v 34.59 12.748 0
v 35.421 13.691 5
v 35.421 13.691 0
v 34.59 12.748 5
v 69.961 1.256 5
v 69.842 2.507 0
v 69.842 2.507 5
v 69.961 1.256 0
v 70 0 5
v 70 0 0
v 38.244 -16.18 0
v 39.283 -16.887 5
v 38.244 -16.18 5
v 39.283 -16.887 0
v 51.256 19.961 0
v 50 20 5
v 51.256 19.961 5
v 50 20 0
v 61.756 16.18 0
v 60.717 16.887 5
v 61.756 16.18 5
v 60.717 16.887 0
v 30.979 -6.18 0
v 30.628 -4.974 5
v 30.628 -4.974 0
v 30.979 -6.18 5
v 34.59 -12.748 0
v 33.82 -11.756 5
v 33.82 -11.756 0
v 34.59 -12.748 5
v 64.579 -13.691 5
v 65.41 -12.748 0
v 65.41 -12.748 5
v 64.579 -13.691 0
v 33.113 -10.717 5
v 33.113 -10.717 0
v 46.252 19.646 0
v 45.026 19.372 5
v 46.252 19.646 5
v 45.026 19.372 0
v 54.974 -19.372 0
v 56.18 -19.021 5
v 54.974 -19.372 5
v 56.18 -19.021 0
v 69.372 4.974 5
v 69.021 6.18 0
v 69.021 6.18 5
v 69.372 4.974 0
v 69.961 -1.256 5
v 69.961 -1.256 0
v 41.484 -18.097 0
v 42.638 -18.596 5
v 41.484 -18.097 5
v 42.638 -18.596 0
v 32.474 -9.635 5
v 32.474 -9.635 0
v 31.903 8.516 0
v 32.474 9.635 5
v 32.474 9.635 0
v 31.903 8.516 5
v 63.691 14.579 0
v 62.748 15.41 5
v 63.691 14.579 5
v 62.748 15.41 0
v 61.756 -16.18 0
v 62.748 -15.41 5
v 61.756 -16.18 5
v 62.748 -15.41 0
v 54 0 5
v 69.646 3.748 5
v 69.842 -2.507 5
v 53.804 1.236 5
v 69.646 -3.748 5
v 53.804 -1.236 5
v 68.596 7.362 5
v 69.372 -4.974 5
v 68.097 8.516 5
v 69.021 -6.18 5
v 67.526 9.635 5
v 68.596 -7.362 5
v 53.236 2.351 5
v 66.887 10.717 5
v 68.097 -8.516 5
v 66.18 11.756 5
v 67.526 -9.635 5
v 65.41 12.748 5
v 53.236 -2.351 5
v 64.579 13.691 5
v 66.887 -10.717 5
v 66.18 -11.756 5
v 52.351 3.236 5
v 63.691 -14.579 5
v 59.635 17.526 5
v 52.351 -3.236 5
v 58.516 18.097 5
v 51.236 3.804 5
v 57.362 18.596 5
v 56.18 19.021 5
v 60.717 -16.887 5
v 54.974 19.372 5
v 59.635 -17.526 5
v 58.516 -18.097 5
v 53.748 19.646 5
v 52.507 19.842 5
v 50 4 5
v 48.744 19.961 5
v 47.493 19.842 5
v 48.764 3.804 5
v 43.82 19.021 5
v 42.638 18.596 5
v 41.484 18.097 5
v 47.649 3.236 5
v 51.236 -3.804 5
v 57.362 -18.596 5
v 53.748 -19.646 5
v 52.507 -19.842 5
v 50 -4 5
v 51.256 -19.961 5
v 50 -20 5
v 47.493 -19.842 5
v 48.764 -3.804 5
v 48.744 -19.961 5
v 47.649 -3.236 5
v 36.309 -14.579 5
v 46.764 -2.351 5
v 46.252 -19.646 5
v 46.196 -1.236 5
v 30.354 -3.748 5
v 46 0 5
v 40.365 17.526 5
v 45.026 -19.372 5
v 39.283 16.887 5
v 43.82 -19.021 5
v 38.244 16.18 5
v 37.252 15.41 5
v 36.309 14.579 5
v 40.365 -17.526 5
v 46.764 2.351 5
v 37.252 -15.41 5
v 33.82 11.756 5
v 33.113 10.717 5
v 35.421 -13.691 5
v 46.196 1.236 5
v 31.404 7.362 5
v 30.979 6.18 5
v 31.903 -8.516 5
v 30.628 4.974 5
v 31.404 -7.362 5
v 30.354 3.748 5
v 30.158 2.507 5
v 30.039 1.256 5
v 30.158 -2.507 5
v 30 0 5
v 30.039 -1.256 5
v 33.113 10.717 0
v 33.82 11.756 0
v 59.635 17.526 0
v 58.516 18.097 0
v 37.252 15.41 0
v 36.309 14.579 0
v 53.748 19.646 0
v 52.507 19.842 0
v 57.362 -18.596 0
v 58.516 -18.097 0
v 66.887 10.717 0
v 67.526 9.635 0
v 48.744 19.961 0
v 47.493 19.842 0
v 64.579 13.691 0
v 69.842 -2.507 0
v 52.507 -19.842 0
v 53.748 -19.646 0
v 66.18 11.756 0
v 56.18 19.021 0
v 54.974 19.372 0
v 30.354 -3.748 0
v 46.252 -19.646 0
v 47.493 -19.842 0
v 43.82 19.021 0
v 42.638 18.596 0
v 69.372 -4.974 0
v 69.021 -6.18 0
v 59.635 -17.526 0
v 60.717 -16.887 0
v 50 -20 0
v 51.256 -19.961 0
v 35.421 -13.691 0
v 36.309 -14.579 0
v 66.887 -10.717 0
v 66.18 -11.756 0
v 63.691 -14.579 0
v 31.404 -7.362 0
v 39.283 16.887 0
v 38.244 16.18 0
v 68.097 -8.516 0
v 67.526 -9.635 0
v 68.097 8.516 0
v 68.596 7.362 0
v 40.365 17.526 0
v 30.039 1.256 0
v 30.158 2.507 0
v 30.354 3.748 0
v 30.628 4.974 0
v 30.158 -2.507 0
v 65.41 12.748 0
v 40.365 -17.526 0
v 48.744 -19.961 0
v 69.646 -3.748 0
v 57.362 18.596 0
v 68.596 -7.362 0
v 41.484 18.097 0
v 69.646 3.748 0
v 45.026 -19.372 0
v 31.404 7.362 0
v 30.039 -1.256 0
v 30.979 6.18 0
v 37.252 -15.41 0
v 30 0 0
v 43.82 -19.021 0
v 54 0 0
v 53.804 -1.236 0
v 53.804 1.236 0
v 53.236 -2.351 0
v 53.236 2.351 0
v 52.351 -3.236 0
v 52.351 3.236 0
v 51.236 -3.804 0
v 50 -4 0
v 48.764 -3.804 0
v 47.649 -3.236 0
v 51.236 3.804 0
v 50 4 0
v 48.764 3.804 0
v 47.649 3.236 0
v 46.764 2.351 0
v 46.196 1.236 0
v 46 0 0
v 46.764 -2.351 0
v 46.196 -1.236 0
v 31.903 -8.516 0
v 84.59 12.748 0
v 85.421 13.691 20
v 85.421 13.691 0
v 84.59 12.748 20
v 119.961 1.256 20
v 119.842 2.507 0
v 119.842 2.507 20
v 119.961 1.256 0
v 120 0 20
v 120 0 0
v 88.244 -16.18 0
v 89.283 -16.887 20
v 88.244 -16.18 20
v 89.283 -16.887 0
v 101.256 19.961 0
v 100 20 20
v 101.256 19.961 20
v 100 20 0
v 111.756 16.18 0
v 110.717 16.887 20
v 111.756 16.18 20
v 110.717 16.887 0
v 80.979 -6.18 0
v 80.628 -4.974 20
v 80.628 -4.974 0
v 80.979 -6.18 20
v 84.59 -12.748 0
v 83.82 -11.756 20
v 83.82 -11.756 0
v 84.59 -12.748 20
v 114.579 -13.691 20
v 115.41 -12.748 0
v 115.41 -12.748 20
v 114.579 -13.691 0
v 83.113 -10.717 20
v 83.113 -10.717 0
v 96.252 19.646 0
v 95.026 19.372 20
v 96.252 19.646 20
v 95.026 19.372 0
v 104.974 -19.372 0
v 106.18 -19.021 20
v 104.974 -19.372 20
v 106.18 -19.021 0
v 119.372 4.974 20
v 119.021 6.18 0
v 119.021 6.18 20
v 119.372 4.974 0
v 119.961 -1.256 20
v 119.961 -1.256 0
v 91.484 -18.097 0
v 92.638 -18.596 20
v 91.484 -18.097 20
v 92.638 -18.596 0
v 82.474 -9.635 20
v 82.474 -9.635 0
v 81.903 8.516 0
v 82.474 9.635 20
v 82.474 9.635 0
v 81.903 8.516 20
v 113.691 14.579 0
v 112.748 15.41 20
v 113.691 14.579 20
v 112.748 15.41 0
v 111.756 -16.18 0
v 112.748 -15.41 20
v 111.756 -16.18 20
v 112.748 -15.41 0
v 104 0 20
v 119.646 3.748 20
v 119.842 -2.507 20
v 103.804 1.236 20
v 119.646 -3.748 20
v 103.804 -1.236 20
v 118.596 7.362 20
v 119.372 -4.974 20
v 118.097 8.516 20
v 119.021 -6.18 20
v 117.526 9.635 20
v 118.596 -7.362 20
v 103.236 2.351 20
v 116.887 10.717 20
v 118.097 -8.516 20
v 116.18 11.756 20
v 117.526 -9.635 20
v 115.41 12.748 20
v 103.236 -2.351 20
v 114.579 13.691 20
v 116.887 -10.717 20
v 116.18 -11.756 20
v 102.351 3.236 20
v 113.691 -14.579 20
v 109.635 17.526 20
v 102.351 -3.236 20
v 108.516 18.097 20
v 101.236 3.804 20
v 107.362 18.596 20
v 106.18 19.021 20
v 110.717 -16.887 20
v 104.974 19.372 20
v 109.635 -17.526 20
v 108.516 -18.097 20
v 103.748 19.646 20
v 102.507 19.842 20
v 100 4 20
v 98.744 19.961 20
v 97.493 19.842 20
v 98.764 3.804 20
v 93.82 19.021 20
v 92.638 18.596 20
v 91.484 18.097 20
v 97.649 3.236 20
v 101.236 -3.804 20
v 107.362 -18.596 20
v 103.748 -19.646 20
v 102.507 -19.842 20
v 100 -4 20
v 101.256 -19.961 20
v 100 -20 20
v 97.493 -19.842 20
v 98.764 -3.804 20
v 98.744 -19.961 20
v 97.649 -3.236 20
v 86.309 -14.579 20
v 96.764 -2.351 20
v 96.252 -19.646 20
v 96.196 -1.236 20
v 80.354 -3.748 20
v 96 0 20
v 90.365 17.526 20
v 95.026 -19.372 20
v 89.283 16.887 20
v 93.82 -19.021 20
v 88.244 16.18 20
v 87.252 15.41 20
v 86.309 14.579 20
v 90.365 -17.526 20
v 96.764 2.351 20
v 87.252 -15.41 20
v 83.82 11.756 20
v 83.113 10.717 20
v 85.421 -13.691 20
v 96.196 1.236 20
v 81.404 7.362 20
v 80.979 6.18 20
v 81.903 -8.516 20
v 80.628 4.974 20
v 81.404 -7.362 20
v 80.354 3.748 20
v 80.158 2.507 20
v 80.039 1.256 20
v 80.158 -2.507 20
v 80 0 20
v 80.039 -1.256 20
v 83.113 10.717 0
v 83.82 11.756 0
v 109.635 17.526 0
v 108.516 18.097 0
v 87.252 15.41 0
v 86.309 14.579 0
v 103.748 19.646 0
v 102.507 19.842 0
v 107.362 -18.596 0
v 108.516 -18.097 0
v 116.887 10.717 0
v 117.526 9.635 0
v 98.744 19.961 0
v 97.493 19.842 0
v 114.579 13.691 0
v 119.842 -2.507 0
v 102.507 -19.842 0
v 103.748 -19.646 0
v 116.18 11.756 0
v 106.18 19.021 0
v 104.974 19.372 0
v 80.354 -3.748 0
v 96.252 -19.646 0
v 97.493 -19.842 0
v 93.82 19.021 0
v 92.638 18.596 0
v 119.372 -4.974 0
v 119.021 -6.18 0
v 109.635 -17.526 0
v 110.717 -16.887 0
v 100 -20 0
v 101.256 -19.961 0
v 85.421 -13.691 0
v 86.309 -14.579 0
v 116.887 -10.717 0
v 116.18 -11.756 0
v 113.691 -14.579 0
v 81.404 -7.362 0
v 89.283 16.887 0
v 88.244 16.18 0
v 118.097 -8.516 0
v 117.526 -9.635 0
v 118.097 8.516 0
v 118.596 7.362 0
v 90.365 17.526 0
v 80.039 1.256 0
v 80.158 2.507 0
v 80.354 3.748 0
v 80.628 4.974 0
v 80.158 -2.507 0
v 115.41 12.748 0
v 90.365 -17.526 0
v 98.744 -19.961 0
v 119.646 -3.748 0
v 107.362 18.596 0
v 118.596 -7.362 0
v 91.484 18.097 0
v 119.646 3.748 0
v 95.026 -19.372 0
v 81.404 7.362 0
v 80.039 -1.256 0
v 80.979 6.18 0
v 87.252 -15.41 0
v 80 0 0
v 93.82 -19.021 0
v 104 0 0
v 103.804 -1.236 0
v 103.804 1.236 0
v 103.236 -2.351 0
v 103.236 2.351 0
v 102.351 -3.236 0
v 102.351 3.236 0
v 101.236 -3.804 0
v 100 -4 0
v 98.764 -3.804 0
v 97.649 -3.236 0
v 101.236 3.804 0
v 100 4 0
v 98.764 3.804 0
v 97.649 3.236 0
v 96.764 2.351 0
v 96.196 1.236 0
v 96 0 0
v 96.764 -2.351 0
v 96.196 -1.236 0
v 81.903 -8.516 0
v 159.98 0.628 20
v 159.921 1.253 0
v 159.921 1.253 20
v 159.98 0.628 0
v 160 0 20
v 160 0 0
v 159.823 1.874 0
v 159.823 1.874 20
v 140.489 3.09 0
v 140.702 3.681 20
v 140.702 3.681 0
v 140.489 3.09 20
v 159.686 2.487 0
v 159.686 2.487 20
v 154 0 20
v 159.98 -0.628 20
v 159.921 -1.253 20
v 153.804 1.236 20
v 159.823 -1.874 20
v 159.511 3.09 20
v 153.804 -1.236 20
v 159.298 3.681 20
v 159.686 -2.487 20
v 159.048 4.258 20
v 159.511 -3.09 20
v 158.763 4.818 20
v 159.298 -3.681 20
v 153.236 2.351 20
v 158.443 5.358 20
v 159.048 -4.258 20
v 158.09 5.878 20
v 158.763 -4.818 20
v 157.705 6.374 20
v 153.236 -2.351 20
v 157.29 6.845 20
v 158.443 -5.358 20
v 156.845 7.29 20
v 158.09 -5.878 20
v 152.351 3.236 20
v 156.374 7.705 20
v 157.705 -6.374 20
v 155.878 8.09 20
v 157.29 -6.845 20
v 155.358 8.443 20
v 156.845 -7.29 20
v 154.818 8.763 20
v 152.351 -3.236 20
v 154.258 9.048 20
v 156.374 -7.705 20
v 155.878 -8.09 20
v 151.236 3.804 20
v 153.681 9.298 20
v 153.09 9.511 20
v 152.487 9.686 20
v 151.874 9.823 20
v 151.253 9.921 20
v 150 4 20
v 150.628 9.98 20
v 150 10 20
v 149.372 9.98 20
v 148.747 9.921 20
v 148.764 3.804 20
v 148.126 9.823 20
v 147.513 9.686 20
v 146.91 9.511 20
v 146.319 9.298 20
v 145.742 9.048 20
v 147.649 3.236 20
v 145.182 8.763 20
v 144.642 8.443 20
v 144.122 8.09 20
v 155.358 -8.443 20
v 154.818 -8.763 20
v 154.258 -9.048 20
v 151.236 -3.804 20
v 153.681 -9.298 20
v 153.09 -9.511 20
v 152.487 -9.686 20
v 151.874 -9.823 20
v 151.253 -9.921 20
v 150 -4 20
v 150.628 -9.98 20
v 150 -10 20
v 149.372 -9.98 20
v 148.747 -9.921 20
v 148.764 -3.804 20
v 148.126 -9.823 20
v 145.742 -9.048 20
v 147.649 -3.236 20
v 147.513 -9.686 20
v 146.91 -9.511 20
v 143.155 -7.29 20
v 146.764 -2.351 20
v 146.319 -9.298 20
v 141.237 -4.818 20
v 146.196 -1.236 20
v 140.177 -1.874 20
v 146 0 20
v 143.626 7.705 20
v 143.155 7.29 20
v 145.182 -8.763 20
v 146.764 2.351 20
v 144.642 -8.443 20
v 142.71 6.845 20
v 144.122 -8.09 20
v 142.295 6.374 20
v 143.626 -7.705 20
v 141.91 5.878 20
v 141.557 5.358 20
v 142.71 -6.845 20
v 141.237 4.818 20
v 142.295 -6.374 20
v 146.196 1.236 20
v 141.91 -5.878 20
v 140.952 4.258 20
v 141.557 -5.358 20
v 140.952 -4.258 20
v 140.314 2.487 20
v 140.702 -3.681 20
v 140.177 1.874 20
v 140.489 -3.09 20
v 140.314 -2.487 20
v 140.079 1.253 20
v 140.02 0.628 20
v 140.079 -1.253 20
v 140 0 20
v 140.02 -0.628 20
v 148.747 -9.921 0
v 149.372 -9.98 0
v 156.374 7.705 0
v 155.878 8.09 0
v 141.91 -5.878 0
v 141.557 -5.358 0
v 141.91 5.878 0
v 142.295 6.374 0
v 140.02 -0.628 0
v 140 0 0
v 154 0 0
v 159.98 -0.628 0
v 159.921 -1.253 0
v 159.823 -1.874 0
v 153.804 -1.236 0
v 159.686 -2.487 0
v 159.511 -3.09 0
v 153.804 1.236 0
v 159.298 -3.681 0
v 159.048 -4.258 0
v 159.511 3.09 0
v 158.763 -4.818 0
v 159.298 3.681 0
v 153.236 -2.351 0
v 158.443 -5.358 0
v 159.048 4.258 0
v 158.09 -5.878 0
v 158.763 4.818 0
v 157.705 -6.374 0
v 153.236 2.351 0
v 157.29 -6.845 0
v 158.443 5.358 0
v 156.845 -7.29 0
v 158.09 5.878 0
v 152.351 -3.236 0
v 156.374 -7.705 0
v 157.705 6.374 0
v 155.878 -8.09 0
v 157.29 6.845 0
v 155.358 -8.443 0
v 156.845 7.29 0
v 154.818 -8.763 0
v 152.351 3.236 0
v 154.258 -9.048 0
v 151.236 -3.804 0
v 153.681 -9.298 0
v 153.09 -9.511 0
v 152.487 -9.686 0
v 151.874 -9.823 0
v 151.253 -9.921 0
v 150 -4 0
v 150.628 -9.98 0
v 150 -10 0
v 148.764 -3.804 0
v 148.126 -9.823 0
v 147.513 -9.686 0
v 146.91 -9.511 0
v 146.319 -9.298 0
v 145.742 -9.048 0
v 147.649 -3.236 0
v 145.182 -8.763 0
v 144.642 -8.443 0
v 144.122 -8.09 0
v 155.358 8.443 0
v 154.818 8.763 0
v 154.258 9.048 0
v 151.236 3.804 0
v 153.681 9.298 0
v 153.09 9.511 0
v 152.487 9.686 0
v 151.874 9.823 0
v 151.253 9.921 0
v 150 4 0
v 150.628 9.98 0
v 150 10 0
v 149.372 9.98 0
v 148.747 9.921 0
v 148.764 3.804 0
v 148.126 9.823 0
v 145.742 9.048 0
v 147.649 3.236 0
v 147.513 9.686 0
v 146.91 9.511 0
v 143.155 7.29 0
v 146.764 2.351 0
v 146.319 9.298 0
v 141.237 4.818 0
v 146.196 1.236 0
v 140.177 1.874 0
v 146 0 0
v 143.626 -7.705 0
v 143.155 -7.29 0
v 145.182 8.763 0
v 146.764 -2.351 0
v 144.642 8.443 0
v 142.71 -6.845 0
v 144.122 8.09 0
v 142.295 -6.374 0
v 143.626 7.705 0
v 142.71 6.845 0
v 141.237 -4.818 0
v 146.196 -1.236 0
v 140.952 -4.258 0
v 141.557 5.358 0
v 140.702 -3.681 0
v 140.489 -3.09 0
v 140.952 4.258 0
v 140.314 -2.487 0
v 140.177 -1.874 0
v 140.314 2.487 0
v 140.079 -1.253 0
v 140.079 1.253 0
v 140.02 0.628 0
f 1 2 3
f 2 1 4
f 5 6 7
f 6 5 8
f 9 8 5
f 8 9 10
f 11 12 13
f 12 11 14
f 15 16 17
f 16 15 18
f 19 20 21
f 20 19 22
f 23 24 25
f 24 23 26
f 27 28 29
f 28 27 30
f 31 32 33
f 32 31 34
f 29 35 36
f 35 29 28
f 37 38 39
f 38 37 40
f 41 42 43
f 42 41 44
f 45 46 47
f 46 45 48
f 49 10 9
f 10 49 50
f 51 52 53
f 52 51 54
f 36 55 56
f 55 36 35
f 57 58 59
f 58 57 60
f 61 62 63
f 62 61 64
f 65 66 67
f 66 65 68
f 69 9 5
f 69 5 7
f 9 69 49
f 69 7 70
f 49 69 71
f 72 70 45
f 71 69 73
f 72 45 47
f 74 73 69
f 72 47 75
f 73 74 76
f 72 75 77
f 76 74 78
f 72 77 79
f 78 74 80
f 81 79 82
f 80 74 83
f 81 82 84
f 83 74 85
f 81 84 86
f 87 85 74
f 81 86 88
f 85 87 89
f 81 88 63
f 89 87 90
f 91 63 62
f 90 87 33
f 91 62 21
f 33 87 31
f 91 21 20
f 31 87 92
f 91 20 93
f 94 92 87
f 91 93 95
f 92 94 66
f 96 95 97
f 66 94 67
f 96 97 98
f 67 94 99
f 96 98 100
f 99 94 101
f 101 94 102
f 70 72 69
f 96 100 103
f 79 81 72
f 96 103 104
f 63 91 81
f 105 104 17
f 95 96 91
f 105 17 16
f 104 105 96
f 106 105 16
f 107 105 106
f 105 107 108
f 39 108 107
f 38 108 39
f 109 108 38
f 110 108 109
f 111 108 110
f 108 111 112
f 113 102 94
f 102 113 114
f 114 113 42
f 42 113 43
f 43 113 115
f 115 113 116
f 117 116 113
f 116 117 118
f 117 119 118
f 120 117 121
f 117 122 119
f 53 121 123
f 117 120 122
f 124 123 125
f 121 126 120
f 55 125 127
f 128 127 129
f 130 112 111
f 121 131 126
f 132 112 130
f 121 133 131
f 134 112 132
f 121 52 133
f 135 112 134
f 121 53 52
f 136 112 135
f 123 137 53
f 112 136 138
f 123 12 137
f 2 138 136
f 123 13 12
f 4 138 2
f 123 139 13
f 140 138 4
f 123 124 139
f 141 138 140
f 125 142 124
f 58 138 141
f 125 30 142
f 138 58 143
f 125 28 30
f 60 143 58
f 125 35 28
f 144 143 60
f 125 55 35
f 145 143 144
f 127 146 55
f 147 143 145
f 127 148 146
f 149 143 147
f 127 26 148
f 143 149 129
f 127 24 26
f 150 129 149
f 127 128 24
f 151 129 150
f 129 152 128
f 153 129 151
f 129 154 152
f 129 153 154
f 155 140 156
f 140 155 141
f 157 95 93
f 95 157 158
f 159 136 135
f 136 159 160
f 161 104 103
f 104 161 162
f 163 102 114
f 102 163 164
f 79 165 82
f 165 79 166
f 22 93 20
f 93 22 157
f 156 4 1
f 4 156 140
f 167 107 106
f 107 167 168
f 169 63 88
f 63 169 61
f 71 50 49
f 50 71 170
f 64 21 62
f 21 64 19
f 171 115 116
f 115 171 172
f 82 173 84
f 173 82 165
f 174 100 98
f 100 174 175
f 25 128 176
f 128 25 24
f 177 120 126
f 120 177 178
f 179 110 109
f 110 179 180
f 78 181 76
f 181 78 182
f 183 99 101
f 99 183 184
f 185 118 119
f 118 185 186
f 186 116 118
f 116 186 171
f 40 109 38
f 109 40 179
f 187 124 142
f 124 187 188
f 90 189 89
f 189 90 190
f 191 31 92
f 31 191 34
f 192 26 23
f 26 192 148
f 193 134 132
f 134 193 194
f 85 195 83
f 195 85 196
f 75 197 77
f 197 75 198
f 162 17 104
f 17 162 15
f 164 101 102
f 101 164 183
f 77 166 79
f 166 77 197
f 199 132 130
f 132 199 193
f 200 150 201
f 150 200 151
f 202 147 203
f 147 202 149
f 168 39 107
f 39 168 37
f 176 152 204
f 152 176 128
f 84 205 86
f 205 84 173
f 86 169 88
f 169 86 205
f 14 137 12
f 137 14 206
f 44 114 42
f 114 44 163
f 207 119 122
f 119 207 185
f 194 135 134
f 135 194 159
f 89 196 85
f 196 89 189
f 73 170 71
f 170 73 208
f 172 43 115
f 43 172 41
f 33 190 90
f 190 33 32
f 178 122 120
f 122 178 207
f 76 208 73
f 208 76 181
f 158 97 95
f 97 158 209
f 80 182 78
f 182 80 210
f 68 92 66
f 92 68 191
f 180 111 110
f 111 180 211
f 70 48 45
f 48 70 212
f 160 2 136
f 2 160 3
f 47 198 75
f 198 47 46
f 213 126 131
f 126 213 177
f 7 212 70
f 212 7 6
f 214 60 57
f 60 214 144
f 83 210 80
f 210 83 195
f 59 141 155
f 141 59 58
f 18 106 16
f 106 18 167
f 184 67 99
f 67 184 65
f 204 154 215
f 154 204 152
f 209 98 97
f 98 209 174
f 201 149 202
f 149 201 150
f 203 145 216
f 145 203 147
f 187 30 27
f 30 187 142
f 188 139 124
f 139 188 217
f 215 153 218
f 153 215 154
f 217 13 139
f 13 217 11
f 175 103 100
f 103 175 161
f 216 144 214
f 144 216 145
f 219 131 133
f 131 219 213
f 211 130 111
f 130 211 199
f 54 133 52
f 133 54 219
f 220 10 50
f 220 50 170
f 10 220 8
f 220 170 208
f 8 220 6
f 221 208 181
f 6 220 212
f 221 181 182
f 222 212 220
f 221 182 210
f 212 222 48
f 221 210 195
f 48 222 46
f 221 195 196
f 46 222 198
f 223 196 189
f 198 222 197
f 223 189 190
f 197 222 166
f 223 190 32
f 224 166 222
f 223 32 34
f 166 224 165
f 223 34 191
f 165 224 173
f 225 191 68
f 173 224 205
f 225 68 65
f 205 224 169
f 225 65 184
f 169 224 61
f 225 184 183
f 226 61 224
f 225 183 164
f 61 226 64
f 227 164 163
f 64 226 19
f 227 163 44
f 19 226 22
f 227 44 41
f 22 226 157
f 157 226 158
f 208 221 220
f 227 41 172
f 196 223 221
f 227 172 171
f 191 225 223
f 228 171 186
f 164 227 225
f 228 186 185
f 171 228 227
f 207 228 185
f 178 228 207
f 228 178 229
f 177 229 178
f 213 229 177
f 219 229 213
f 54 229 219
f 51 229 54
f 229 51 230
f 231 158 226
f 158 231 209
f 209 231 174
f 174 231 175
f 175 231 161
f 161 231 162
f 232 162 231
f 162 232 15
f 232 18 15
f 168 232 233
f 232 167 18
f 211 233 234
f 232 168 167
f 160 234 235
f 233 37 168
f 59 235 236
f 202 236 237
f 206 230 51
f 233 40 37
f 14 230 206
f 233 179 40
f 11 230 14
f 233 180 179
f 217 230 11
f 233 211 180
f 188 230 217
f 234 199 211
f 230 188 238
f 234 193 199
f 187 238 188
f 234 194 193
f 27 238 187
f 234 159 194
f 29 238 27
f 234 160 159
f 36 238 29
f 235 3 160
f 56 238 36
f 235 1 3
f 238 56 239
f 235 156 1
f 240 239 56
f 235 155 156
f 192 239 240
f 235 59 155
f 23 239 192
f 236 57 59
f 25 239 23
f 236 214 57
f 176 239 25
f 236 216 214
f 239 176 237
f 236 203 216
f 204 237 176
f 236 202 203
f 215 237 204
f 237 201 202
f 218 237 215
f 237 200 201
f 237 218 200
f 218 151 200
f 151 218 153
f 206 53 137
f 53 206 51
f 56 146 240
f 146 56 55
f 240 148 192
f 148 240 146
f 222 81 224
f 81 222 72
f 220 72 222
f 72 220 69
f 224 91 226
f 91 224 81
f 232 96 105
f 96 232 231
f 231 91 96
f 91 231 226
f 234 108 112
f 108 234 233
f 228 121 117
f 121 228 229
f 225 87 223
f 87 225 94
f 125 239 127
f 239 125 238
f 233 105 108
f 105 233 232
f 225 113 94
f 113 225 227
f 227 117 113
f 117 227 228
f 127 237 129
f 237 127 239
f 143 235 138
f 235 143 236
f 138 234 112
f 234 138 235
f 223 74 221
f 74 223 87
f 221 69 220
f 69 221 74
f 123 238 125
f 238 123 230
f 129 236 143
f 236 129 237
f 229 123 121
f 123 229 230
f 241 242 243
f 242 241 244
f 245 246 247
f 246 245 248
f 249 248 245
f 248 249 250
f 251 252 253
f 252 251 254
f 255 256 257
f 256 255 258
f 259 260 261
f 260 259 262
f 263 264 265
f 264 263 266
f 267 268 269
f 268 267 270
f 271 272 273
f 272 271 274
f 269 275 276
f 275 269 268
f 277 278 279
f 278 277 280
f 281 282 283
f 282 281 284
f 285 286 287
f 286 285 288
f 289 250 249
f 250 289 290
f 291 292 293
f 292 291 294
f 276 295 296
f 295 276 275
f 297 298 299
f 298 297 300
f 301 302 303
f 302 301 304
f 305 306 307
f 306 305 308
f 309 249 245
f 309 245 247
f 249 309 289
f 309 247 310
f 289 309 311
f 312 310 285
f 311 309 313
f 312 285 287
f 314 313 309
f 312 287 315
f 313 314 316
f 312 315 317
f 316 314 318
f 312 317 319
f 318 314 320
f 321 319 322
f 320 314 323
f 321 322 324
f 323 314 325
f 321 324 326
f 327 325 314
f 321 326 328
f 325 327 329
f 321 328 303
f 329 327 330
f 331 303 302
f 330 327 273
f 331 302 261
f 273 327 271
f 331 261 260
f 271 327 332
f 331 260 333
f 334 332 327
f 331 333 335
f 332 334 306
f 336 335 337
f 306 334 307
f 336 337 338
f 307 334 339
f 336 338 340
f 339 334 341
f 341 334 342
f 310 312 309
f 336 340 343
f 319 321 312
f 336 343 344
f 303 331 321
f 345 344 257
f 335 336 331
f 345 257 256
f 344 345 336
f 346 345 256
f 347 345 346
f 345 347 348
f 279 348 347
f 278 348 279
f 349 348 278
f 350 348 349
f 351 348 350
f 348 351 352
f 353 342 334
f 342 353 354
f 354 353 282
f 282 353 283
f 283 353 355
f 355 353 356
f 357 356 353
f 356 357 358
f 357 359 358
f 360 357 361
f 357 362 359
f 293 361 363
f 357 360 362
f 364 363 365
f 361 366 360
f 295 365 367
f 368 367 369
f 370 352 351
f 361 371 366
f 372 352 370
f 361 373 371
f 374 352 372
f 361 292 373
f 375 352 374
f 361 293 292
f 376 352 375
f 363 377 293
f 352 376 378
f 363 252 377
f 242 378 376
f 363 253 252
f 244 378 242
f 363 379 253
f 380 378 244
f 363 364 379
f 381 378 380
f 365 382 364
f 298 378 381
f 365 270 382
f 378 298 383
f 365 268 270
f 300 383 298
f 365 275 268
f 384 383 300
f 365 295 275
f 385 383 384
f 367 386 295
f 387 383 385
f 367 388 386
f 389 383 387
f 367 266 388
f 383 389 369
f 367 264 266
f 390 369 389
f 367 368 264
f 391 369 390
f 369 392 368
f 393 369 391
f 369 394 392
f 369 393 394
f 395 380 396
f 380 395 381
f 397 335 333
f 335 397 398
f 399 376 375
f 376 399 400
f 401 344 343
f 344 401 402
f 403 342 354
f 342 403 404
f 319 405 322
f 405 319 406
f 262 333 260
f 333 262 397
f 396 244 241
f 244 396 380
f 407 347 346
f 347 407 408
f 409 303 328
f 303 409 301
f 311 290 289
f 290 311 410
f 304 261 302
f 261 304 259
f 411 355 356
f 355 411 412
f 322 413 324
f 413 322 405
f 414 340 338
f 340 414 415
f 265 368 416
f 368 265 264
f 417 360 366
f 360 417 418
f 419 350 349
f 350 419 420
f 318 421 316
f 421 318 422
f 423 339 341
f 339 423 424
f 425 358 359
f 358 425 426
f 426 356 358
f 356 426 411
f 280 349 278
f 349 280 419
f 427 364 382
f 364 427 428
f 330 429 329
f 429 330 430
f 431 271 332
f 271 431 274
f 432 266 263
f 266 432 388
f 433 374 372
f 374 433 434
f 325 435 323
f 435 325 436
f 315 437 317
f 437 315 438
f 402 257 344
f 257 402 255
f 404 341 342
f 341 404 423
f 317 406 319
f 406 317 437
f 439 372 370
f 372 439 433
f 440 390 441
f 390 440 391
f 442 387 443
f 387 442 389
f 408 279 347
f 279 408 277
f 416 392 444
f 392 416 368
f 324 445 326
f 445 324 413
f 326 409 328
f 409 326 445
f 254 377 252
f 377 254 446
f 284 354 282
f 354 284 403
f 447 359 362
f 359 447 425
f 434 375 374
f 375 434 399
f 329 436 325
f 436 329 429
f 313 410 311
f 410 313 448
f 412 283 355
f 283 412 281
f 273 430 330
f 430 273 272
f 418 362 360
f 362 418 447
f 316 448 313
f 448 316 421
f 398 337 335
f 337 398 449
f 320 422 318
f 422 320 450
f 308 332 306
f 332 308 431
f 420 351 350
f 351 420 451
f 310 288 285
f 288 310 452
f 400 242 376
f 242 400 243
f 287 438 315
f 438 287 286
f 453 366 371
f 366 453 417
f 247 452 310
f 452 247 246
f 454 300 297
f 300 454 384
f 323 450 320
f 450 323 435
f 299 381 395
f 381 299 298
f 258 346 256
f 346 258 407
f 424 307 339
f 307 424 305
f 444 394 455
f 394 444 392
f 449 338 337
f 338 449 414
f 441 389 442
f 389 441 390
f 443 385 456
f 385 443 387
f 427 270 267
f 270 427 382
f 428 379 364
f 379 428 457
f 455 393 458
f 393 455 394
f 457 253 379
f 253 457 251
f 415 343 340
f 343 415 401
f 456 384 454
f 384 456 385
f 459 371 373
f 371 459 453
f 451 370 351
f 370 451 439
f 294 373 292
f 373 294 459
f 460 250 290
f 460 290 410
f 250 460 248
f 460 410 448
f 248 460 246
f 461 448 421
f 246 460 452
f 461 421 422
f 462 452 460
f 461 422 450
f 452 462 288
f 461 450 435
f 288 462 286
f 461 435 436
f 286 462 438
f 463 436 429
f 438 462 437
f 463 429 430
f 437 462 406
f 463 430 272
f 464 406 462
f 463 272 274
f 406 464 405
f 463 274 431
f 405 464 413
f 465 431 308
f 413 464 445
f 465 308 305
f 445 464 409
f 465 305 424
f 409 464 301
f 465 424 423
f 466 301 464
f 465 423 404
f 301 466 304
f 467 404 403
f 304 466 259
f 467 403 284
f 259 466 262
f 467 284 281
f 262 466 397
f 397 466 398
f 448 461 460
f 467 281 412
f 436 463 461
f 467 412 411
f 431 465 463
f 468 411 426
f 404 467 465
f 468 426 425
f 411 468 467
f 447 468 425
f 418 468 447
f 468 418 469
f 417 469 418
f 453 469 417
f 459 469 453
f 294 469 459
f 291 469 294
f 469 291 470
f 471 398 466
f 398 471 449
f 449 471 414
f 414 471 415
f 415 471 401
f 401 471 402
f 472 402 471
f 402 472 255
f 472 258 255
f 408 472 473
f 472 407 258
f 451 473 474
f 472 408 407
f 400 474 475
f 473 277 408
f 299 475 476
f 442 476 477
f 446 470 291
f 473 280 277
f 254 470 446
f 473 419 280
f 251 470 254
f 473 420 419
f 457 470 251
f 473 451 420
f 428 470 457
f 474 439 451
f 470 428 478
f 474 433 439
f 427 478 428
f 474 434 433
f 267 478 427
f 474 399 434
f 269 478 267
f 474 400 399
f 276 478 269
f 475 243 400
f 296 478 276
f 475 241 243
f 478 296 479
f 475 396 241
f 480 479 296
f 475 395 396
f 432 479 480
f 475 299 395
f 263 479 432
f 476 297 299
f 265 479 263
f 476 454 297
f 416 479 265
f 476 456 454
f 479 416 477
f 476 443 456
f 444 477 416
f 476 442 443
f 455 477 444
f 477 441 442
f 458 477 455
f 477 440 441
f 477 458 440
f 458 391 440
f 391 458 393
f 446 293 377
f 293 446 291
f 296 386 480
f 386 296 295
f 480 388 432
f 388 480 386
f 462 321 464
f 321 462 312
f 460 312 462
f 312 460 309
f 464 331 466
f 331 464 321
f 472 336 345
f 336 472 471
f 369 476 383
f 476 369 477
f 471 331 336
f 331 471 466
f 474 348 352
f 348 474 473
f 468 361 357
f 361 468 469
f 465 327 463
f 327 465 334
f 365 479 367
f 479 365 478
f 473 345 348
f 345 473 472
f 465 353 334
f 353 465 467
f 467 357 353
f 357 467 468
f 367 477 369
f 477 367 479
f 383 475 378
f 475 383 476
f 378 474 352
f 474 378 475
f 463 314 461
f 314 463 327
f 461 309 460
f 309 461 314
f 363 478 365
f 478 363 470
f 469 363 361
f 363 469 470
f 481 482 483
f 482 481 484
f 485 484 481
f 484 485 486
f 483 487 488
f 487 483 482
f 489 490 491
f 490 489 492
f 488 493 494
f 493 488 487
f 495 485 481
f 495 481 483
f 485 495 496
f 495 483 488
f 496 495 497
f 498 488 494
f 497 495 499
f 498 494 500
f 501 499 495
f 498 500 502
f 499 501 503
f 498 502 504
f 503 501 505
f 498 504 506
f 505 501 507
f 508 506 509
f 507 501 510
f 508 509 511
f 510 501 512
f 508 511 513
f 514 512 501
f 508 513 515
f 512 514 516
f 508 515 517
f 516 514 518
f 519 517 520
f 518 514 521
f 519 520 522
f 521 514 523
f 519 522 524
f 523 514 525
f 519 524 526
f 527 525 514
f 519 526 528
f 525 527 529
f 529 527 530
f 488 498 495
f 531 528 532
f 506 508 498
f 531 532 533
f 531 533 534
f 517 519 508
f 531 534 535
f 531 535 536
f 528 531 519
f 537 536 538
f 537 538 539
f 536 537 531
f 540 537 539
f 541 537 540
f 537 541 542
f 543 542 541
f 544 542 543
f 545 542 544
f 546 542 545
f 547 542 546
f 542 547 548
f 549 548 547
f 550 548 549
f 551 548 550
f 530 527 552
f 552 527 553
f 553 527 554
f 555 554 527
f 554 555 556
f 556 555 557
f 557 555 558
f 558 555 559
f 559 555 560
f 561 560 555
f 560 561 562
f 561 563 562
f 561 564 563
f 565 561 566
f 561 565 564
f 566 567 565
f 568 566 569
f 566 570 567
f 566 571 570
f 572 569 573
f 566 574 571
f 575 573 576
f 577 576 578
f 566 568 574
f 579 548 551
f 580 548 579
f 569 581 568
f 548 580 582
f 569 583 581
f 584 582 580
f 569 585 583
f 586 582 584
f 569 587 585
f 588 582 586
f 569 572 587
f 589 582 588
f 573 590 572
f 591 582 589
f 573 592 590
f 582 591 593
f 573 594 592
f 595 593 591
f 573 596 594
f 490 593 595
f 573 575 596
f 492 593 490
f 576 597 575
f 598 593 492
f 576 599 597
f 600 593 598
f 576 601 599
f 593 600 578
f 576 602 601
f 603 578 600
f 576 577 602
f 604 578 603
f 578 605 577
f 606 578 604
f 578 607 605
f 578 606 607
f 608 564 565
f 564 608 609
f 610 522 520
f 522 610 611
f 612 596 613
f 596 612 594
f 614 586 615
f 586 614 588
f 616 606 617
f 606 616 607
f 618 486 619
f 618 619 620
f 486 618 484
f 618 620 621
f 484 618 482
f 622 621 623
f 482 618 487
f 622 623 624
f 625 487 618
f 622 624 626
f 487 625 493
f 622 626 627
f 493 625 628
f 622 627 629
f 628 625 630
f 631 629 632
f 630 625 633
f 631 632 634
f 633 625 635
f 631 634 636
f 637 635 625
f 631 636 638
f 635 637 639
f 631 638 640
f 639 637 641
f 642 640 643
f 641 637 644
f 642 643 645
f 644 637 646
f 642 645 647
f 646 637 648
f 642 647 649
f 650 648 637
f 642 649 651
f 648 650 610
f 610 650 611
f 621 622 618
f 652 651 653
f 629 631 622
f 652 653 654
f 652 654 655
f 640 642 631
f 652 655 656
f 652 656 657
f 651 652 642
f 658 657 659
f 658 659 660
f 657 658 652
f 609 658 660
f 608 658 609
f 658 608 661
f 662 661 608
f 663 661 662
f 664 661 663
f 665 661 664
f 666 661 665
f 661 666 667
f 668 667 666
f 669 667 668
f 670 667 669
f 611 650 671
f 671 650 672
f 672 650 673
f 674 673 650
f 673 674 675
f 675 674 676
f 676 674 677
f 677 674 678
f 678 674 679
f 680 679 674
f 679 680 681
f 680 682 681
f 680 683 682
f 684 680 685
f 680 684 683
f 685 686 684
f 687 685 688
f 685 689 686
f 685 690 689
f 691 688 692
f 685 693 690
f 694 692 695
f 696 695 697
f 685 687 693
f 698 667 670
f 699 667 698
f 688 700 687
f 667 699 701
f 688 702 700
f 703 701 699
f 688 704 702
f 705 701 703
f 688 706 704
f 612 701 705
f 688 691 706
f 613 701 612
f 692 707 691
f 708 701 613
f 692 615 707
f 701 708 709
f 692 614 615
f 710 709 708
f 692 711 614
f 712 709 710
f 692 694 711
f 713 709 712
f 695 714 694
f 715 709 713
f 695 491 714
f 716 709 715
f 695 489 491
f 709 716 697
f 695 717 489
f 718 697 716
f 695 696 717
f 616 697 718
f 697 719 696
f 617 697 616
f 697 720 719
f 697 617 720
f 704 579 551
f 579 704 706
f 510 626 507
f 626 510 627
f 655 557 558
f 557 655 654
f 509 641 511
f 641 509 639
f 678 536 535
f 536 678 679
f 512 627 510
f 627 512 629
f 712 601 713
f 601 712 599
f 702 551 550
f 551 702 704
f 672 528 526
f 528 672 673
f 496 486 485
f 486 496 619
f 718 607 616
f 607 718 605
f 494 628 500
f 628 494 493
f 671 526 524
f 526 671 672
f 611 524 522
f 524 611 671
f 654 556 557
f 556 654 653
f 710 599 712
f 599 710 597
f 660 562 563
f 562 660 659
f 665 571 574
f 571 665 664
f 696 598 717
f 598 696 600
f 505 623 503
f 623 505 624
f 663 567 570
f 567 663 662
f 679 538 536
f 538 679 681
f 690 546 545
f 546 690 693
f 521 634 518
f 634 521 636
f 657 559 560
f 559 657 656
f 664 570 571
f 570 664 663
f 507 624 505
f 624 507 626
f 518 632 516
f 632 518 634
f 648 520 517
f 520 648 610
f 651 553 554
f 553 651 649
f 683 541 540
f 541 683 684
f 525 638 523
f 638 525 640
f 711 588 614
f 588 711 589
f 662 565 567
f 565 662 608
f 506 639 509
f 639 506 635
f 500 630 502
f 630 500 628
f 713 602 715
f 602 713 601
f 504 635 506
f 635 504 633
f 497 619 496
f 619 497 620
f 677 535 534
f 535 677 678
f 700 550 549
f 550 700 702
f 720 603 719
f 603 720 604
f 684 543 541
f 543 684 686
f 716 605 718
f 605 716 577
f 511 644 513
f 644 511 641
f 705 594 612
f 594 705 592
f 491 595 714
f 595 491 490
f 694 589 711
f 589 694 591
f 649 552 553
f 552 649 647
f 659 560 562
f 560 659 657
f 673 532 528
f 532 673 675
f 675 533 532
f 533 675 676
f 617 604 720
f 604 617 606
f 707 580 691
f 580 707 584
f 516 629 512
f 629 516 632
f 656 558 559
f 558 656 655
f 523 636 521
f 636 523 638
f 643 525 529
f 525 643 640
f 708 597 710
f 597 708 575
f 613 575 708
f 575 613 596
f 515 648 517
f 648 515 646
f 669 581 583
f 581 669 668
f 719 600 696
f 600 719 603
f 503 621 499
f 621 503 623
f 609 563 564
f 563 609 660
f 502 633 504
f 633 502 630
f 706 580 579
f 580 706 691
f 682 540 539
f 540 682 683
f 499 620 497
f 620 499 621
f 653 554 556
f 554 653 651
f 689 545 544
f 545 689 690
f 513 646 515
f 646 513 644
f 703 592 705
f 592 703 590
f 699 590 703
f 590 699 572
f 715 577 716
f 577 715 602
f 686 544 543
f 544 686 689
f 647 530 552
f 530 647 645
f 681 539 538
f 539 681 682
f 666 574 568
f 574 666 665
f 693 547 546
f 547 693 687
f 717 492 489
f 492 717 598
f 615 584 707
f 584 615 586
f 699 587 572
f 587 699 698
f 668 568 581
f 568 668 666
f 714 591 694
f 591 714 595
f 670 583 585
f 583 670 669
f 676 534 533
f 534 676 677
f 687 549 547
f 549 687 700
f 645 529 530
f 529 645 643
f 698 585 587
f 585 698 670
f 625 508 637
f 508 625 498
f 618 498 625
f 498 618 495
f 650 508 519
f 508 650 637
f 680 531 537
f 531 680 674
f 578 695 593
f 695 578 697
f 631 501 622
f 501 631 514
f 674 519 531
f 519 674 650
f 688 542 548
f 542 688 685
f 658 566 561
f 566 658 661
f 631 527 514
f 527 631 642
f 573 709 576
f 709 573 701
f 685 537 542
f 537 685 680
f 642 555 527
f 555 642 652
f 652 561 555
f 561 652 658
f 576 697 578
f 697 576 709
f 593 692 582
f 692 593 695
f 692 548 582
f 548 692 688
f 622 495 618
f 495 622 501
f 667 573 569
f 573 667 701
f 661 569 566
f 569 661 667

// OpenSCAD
// Partiendo del ejemplo anterior de la rueda parametrizable, vamos a ver
//     cómo poder generar estas figuras con valores por defecto. De este
//     modo, no tendremos que llamar a todos los parámetros de entrada
//     al invocar al módulo.

// Especificamos que el parámetro grosor por defecto será 5mm, el diámetro por defecto 40mm y el diámetro del eje de 8mm
module rueda_simple(grosor=5, diametro=40, diam_eje=8){
    // Cilindro con agujero central
    difference(){
        // Cilindro exterior
        cylinder(r=diametro/2, h=grosor, $fn=100);
        // Cilindro taladro central.
        cylinder(r=diam_eje/2, h=grosor*3, $fn=20, center=true);
        // NOTA: Multiplicamos por 3 la altura para asegurar que se
        //     atraviesa completamente la figura.
        }
    }


// Creamos una rueda simple sin parámetros usando valores por defecto):
translate([50, 0, 0]){
    rueda_simple();
}

// Añadimos una segunda rueda únicamente cambiando el grosor a 20
translate([100, 0, 0]){
    rueda_simple(grosor=20);
}

// Finalmente creamos otra rueda cambiando el grosor a 20
translate([150, 0, 0]){
    rueda_simple(grosor=20, diametro=20);
}
